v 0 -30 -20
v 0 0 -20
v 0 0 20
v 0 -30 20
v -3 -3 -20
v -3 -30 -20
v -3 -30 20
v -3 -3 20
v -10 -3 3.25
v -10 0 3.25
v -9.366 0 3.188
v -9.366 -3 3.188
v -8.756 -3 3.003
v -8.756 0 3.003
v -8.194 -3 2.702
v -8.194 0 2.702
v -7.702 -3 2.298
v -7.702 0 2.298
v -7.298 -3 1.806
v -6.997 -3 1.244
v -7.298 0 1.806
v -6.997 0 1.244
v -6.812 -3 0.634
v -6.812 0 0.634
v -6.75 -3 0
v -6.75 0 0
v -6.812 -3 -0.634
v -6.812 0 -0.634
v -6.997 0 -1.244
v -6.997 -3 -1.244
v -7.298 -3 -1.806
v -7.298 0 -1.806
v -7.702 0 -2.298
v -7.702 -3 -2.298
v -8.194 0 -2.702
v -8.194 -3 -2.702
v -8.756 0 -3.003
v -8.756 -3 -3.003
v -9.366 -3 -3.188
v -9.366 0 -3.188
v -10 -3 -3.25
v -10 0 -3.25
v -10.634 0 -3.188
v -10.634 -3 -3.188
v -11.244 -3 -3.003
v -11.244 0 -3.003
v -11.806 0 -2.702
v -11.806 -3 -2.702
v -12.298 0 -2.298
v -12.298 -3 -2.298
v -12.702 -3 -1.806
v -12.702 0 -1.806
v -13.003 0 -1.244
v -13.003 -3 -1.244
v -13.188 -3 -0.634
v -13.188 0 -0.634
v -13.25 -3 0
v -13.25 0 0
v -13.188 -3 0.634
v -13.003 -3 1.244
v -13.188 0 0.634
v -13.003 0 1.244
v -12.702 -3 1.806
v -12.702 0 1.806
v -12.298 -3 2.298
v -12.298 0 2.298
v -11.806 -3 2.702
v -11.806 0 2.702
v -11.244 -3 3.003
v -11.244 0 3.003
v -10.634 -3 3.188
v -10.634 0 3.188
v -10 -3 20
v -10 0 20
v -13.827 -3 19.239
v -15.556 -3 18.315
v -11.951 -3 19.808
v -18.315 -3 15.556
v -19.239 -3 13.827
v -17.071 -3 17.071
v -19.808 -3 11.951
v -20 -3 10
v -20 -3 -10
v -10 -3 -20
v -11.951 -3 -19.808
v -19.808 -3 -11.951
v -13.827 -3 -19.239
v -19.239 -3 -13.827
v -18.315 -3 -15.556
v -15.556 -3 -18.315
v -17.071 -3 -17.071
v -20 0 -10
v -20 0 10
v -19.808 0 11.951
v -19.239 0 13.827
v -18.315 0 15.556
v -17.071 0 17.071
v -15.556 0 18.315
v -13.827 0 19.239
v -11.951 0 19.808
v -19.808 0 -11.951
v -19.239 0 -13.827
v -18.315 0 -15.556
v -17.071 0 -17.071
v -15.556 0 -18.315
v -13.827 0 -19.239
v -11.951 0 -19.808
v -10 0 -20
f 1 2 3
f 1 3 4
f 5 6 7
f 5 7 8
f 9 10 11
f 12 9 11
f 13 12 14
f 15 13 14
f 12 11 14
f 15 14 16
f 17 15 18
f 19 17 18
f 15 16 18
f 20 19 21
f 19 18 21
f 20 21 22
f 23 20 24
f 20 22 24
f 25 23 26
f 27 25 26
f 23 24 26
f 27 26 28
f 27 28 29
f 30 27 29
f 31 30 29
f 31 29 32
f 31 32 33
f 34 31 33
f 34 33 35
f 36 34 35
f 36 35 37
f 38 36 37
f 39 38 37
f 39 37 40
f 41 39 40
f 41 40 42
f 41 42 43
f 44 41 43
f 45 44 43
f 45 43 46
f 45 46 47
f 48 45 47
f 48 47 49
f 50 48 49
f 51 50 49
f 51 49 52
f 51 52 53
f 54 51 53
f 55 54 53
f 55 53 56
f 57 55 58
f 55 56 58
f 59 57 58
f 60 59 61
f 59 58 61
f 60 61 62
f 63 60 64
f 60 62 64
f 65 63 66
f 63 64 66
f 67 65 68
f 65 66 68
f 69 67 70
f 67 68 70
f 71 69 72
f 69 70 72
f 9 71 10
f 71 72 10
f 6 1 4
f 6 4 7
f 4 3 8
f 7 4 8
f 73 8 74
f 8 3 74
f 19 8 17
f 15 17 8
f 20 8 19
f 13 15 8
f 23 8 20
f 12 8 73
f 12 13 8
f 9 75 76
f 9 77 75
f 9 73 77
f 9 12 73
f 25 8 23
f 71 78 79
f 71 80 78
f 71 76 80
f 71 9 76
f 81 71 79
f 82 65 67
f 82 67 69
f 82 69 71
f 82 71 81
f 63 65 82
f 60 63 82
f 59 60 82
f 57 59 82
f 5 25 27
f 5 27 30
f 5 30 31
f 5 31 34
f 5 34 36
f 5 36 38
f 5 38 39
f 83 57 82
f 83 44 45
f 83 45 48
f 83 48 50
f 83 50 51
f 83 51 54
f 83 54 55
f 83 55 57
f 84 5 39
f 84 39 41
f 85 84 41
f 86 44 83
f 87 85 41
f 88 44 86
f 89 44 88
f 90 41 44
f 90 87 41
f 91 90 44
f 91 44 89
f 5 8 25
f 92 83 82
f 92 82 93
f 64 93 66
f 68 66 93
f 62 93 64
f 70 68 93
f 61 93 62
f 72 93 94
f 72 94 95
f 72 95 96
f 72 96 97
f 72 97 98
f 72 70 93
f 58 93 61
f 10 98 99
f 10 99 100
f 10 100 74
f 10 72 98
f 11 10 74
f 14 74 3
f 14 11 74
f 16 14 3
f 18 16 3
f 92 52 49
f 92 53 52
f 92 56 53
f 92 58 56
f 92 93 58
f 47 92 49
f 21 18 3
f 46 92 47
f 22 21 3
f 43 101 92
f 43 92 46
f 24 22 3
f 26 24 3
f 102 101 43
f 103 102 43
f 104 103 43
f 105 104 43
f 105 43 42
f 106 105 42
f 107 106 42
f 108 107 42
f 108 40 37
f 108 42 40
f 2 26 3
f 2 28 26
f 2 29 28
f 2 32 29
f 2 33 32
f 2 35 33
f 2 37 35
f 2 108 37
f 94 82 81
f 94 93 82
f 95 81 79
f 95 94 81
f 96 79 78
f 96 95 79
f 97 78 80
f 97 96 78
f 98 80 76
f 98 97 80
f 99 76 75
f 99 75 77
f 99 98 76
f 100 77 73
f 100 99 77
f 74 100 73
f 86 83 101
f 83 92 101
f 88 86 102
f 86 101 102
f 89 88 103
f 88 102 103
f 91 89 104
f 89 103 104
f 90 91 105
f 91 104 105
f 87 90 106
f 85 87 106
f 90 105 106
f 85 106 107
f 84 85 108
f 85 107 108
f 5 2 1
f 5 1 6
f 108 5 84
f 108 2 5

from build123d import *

# Parameters (mm, degrees)
EXTRUDE_1_DEPTH      = 20
EXTRUDE_1_DEPTH_BACK = 20
SKETCH_2_R           = 3.25
CUT_EXTRUDE_1_DEPTH  = 40
FILLET_1_R           = 10


with BuildPart() as part:
    # ｽｹｯﾁ1 → ﾎﾞｽ - 押し出し1 (new, two sides: drawn at the far end of the back side and taken through both)
    with BuildSketch(Plane.XY.offset(-EXTRUDE_1_DEPTH_BACK)):
        Polygon((-20, 0), (0, 0), (0, -30), (-3, -30), (-3, -3), (-20, -3), align=None)
    extrude(amount=EXTRUDE_1_DEPTH + EXTRUDE_1_DEPTH_BACK)

    # ｽｹｯﾁ2 → ｶｯﾄ - 押し出し1 (cut)
    with BuildSketch(Plane(origin=(0, 0, 0), x_dir=(1, 0, 0), z_dir=(0, 1, 0))):
        with Locations((-10, 0)):
            Circle(SKETCH_2_R)
    extrude(amount=-CUT_EXTRUDE_1_DEPTH, mode=Mode.SUBTRACT)

    # ﾌｨﾚｯﾄ1
    fillet_1_edges = [part.edges().sort_by_distance(p)[0] for p in [
        (-20, -1.5, -20),
        (-20, -1.5, 20),
    ]]
    fillet(fillet_1_edges, radius=FILLET_1_R)


solid = part.part
